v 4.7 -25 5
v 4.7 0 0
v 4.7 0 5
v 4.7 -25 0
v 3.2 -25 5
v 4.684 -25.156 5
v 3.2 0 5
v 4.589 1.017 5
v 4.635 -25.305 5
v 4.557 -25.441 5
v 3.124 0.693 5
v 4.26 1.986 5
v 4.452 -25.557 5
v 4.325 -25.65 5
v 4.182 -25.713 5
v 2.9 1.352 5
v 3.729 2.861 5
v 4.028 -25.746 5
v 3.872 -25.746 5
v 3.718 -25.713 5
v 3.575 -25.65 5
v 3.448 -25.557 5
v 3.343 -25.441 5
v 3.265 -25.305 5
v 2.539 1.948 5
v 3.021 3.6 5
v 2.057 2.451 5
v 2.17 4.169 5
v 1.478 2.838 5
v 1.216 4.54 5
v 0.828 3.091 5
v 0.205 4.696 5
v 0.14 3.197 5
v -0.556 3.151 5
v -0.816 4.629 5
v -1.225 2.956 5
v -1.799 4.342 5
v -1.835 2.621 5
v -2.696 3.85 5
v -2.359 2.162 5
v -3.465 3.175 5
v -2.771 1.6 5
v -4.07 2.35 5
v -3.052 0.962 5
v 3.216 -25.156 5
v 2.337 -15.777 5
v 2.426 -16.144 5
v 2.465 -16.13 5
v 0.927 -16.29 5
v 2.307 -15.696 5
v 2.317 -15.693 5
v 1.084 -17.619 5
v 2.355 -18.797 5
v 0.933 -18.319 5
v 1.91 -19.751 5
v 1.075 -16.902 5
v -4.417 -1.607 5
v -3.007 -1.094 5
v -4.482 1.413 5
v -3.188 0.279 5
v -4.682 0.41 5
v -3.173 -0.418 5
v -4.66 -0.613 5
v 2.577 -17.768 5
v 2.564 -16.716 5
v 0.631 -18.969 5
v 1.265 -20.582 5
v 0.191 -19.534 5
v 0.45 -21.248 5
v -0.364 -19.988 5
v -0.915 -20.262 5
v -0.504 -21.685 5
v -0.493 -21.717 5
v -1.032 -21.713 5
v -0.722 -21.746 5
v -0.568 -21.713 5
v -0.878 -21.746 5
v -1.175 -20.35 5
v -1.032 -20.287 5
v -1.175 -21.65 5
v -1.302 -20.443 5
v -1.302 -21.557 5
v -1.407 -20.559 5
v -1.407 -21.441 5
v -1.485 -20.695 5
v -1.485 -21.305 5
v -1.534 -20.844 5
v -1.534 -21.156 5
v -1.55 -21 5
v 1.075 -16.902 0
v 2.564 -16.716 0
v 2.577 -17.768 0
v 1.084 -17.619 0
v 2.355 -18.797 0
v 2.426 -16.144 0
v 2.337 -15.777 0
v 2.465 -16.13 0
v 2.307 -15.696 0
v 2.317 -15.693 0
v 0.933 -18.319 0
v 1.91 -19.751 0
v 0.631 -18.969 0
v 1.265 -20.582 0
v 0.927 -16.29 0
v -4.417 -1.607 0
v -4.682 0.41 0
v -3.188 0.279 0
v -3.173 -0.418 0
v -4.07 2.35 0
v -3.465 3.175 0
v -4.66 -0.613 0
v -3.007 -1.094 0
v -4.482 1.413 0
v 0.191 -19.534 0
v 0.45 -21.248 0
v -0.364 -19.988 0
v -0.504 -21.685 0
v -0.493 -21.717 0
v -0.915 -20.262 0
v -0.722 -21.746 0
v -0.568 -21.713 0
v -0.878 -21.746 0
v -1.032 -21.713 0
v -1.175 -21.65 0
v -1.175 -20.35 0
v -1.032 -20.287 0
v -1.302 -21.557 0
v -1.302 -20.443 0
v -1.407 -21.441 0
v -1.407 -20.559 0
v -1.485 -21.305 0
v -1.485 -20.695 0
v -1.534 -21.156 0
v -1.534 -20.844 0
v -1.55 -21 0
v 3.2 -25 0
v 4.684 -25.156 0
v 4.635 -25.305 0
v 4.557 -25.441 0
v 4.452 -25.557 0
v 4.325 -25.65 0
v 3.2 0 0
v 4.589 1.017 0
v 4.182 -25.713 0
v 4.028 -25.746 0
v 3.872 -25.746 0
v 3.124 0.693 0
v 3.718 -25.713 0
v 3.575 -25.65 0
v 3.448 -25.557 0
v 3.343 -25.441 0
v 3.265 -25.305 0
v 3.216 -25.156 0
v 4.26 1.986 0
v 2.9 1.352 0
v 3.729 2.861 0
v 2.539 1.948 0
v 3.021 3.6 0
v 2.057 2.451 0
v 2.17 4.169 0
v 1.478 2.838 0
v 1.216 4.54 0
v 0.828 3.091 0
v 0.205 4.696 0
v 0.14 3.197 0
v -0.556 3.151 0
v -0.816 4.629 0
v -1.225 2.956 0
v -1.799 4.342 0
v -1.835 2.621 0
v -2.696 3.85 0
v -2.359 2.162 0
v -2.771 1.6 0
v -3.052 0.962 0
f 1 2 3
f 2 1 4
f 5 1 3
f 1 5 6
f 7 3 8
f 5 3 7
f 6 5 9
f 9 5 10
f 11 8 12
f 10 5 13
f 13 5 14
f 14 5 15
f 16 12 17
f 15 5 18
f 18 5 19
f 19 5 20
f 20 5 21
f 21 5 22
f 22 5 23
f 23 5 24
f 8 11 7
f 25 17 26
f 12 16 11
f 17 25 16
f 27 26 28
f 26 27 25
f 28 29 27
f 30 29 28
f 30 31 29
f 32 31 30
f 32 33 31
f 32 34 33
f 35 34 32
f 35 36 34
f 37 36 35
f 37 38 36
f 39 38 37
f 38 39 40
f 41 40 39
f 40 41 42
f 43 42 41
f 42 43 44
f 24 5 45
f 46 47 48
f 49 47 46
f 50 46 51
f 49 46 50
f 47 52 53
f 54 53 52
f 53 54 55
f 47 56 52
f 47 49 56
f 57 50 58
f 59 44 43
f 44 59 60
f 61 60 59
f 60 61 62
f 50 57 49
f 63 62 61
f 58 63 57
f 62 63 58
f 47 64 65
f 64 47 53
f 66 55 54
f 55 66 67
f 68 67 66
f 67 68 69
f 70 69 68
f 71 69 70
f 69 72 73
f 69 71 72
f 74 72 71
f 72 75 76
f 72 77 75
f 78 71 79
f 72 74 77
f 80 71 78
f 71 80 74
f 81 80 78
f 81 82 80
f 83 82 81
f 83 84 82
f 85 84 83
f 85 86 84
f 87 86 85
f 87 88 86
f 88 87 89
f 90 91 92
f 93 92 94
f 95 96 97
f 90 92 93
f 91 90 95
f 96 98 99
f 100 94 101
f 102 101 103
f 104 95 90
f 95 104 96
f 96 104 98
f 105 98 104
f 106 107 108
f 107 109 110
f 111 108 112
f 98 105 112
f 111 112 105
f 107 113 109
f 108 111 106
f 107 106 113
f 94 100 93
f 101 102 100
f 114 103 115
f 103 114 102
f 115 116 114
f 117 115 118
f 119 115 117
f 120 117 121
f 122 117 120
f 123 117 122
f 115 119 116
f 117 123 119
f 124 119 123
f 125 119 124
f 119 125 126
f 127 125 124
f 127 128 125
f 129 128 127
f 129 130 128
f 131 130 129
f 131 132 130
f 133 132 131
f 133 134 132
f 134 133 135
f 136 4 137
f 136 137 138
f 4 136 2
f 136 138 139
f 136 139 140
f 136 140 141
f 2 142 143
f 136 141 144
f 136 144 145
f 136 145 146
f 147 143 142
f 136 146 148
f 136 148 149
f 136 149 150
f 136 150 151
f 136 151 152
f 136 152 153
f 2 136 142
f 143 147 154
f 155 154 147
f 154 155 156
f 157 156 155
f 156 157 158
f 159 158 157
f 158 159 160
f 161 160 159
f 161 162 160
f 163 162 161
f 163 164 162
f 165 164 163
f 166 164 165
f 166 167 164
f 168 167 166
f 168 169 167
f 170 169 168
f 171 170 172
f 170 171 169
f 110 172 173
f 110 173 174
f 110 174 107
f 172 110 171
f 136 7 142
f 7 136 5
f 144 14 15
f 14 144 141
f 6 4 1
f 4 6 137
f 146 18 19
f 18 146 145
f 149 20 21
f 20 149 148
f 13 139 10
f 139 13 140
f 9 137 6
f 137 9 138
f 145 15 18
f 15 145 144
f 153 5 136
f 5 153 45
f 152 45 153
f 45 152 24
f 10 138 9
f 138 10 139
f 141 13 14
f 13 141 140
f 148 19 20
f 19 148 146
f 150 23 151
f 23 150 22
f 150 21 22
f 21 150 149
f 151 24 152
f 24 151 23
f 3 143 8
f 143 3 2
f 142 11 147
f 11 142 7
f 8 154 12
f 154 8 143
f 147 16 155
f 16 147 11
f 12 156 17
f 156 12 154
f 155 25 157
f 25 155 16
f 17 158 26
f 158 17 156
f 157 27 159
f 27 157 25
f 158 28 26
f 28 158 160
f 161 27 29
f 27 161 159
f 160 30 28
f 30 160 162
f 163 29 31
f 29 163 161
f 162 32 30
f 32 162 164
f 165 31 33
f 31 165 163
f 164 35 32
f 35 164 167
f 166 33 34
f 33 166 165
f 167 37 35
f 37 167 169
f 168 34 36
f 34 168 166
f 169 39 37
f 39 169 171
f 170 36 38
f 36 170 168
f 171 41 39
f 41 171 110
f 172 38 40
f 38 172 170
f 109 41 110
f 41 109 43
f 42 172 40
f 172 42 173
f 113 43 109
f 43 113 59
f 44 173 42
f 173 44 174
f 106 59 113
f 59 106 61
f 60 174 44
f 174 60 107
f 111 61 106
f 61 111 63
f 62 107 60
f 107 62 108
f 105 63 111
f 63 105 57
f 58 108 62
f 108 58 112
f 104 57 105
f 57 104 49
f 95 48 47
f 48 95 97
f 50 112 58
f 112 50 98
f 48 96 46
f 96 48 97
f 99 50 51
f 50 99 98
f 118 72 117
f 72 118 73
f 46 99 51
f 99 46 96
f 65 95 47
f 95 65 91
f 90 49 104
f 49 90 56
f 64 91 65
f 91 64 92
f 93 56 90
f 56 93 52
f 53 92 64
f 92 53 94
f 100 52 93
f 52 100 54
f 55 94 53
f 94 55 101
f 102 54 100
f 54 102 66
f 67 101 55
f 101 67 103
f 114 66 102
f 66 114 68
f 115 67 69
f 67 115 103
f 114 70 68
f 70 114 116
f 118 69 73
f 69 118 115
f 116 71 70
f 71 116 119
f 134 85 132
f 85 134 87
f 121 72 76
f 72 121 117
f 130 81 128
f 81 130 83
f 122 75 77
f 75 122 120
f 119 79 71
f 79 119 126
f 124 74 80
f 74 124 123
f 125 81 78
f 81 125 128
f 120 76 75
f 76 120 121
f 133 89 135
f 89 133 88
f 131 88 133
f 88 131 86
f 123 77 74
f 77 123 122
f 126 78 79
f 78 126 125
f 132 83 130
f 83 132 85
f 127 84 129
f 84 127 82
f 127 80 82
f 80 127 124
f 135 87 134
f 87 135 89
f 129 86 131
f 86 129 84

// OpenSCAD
d = 6.4;
thickness = 1.5;

$fn=30;

module version1() {
  rotate_extrude(angle=210)
    translate([d/2, 0, 0])
      square([thickness, 5]);

  translate([d/2, -20, 0])
    cube([thickness, 20, 5]);
  translate([d/2+thickness/2, -20, 0]) cylinder(d=thickness, h=5);

  translate([-6.7, -3.8, 0]) rotate([0, 0, 30])
  rotate_extrude(angle=-70)
    translate([d/2, 0, 0])
      square([thickness, 5]);
  translate([-3.7, -6.25, 0]) cylinder(d=thickness, h=5);
}

module version2() {
  translate([d/2, -25, 0])
    cube([thickness, 25, 5]);
  translate([d/2+thickness/2, -25, 0]) cylinder(d=thickness, h=5);

  rotate_extrude(angle=200)
    translate([d/2, 0, 0])
      square([thickness, 5]);

  rotate([0, 0, 20])
    translate([-4.7, -16, 0])
      cube([thickness, 16, 5]);

  translate([-2.1, -17.3, 0]) rotate([0, 0, 20])
  rotate_extrude(angle=-90)
    translate([d/2, 0, 0])
      square([thickness, 5]);
  translate([-0.8, -21, 0]) cylinder(d=thickness, h=5);

}

version2();
